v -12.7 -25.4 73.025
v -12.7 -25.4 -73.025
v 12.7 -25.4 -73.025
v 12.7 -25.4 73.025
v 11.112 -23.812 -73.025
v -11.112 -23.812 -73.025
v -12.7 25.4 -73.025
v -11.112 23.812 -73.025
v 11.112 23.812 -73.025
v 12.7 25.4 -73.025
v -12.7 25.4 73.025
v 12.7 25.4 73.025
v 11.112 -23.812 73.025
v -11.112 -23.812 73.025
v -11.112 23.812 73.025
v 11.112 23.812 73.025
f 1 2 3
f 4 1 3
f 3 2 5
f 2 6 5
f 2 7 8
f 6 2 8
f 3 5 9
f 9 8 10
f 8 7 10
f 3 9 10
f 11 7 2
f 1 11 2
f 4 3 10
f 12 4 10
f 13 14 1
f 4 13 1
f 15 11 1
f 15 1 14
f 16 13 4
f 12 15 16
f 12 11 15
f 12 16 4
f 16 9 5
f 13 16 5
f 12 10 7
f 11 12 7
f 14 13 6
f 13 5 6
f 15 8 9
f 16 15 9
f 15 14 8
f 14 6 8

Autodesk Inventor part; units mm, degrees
ref_plane "YZ Plane" through (0, 0, 0) normal (1, 0, 0) x (0, 1, 0)
ref_plane "XZ Plane" through (0, 0, 0) normal (0, 1, 0) x (-1, 0, 0)
ref_plane "XY Plane" through (0, 0, 0) normal (0, 0, 1) x (1, 0, 0)
sketch "Sketch1" plane through (0, 0, 0) normal (0, 0, 1) x (1, 0, 0)
  line L0 (-12.7, -25.4) -> (12.7, -25.4)
  line L1 (12.7, -25.4) -> (12.7, 25.4)
  line L2 (12.7, 25.4) -> (-12.7, 25.4)
  line L3 (-12.7, 25.4) -> (-12.7, -25.4)
  line L4 (-12.7, -25.4) -> (12.7, 25.4) construction
  line L5 (12.7, -25.4) -> (-12.7, 25.4) construction
  line L6 (-11.1125, 23.8125) -> (11.1125, 23.8125)
  line L7 (11.1125, 23.8125) -> (11.1125, -23.8125)
  line L8 (11.1125, -23.8125) -> (-11.1125, -23.8125)
  line L9 (-11.1125, -23.8125) -> (-11.1125, 23.8125)
  point P0 (0, 0)
  dimension "width" = 25.4
  dimension "height" = 50.8
  dimension "thickness" = 1.5875
extrude "Extrusion1" add sketch "Sketch1" along normal mid plane 146.05
properties part number "CL3-007" material "Aluminum 6061"
